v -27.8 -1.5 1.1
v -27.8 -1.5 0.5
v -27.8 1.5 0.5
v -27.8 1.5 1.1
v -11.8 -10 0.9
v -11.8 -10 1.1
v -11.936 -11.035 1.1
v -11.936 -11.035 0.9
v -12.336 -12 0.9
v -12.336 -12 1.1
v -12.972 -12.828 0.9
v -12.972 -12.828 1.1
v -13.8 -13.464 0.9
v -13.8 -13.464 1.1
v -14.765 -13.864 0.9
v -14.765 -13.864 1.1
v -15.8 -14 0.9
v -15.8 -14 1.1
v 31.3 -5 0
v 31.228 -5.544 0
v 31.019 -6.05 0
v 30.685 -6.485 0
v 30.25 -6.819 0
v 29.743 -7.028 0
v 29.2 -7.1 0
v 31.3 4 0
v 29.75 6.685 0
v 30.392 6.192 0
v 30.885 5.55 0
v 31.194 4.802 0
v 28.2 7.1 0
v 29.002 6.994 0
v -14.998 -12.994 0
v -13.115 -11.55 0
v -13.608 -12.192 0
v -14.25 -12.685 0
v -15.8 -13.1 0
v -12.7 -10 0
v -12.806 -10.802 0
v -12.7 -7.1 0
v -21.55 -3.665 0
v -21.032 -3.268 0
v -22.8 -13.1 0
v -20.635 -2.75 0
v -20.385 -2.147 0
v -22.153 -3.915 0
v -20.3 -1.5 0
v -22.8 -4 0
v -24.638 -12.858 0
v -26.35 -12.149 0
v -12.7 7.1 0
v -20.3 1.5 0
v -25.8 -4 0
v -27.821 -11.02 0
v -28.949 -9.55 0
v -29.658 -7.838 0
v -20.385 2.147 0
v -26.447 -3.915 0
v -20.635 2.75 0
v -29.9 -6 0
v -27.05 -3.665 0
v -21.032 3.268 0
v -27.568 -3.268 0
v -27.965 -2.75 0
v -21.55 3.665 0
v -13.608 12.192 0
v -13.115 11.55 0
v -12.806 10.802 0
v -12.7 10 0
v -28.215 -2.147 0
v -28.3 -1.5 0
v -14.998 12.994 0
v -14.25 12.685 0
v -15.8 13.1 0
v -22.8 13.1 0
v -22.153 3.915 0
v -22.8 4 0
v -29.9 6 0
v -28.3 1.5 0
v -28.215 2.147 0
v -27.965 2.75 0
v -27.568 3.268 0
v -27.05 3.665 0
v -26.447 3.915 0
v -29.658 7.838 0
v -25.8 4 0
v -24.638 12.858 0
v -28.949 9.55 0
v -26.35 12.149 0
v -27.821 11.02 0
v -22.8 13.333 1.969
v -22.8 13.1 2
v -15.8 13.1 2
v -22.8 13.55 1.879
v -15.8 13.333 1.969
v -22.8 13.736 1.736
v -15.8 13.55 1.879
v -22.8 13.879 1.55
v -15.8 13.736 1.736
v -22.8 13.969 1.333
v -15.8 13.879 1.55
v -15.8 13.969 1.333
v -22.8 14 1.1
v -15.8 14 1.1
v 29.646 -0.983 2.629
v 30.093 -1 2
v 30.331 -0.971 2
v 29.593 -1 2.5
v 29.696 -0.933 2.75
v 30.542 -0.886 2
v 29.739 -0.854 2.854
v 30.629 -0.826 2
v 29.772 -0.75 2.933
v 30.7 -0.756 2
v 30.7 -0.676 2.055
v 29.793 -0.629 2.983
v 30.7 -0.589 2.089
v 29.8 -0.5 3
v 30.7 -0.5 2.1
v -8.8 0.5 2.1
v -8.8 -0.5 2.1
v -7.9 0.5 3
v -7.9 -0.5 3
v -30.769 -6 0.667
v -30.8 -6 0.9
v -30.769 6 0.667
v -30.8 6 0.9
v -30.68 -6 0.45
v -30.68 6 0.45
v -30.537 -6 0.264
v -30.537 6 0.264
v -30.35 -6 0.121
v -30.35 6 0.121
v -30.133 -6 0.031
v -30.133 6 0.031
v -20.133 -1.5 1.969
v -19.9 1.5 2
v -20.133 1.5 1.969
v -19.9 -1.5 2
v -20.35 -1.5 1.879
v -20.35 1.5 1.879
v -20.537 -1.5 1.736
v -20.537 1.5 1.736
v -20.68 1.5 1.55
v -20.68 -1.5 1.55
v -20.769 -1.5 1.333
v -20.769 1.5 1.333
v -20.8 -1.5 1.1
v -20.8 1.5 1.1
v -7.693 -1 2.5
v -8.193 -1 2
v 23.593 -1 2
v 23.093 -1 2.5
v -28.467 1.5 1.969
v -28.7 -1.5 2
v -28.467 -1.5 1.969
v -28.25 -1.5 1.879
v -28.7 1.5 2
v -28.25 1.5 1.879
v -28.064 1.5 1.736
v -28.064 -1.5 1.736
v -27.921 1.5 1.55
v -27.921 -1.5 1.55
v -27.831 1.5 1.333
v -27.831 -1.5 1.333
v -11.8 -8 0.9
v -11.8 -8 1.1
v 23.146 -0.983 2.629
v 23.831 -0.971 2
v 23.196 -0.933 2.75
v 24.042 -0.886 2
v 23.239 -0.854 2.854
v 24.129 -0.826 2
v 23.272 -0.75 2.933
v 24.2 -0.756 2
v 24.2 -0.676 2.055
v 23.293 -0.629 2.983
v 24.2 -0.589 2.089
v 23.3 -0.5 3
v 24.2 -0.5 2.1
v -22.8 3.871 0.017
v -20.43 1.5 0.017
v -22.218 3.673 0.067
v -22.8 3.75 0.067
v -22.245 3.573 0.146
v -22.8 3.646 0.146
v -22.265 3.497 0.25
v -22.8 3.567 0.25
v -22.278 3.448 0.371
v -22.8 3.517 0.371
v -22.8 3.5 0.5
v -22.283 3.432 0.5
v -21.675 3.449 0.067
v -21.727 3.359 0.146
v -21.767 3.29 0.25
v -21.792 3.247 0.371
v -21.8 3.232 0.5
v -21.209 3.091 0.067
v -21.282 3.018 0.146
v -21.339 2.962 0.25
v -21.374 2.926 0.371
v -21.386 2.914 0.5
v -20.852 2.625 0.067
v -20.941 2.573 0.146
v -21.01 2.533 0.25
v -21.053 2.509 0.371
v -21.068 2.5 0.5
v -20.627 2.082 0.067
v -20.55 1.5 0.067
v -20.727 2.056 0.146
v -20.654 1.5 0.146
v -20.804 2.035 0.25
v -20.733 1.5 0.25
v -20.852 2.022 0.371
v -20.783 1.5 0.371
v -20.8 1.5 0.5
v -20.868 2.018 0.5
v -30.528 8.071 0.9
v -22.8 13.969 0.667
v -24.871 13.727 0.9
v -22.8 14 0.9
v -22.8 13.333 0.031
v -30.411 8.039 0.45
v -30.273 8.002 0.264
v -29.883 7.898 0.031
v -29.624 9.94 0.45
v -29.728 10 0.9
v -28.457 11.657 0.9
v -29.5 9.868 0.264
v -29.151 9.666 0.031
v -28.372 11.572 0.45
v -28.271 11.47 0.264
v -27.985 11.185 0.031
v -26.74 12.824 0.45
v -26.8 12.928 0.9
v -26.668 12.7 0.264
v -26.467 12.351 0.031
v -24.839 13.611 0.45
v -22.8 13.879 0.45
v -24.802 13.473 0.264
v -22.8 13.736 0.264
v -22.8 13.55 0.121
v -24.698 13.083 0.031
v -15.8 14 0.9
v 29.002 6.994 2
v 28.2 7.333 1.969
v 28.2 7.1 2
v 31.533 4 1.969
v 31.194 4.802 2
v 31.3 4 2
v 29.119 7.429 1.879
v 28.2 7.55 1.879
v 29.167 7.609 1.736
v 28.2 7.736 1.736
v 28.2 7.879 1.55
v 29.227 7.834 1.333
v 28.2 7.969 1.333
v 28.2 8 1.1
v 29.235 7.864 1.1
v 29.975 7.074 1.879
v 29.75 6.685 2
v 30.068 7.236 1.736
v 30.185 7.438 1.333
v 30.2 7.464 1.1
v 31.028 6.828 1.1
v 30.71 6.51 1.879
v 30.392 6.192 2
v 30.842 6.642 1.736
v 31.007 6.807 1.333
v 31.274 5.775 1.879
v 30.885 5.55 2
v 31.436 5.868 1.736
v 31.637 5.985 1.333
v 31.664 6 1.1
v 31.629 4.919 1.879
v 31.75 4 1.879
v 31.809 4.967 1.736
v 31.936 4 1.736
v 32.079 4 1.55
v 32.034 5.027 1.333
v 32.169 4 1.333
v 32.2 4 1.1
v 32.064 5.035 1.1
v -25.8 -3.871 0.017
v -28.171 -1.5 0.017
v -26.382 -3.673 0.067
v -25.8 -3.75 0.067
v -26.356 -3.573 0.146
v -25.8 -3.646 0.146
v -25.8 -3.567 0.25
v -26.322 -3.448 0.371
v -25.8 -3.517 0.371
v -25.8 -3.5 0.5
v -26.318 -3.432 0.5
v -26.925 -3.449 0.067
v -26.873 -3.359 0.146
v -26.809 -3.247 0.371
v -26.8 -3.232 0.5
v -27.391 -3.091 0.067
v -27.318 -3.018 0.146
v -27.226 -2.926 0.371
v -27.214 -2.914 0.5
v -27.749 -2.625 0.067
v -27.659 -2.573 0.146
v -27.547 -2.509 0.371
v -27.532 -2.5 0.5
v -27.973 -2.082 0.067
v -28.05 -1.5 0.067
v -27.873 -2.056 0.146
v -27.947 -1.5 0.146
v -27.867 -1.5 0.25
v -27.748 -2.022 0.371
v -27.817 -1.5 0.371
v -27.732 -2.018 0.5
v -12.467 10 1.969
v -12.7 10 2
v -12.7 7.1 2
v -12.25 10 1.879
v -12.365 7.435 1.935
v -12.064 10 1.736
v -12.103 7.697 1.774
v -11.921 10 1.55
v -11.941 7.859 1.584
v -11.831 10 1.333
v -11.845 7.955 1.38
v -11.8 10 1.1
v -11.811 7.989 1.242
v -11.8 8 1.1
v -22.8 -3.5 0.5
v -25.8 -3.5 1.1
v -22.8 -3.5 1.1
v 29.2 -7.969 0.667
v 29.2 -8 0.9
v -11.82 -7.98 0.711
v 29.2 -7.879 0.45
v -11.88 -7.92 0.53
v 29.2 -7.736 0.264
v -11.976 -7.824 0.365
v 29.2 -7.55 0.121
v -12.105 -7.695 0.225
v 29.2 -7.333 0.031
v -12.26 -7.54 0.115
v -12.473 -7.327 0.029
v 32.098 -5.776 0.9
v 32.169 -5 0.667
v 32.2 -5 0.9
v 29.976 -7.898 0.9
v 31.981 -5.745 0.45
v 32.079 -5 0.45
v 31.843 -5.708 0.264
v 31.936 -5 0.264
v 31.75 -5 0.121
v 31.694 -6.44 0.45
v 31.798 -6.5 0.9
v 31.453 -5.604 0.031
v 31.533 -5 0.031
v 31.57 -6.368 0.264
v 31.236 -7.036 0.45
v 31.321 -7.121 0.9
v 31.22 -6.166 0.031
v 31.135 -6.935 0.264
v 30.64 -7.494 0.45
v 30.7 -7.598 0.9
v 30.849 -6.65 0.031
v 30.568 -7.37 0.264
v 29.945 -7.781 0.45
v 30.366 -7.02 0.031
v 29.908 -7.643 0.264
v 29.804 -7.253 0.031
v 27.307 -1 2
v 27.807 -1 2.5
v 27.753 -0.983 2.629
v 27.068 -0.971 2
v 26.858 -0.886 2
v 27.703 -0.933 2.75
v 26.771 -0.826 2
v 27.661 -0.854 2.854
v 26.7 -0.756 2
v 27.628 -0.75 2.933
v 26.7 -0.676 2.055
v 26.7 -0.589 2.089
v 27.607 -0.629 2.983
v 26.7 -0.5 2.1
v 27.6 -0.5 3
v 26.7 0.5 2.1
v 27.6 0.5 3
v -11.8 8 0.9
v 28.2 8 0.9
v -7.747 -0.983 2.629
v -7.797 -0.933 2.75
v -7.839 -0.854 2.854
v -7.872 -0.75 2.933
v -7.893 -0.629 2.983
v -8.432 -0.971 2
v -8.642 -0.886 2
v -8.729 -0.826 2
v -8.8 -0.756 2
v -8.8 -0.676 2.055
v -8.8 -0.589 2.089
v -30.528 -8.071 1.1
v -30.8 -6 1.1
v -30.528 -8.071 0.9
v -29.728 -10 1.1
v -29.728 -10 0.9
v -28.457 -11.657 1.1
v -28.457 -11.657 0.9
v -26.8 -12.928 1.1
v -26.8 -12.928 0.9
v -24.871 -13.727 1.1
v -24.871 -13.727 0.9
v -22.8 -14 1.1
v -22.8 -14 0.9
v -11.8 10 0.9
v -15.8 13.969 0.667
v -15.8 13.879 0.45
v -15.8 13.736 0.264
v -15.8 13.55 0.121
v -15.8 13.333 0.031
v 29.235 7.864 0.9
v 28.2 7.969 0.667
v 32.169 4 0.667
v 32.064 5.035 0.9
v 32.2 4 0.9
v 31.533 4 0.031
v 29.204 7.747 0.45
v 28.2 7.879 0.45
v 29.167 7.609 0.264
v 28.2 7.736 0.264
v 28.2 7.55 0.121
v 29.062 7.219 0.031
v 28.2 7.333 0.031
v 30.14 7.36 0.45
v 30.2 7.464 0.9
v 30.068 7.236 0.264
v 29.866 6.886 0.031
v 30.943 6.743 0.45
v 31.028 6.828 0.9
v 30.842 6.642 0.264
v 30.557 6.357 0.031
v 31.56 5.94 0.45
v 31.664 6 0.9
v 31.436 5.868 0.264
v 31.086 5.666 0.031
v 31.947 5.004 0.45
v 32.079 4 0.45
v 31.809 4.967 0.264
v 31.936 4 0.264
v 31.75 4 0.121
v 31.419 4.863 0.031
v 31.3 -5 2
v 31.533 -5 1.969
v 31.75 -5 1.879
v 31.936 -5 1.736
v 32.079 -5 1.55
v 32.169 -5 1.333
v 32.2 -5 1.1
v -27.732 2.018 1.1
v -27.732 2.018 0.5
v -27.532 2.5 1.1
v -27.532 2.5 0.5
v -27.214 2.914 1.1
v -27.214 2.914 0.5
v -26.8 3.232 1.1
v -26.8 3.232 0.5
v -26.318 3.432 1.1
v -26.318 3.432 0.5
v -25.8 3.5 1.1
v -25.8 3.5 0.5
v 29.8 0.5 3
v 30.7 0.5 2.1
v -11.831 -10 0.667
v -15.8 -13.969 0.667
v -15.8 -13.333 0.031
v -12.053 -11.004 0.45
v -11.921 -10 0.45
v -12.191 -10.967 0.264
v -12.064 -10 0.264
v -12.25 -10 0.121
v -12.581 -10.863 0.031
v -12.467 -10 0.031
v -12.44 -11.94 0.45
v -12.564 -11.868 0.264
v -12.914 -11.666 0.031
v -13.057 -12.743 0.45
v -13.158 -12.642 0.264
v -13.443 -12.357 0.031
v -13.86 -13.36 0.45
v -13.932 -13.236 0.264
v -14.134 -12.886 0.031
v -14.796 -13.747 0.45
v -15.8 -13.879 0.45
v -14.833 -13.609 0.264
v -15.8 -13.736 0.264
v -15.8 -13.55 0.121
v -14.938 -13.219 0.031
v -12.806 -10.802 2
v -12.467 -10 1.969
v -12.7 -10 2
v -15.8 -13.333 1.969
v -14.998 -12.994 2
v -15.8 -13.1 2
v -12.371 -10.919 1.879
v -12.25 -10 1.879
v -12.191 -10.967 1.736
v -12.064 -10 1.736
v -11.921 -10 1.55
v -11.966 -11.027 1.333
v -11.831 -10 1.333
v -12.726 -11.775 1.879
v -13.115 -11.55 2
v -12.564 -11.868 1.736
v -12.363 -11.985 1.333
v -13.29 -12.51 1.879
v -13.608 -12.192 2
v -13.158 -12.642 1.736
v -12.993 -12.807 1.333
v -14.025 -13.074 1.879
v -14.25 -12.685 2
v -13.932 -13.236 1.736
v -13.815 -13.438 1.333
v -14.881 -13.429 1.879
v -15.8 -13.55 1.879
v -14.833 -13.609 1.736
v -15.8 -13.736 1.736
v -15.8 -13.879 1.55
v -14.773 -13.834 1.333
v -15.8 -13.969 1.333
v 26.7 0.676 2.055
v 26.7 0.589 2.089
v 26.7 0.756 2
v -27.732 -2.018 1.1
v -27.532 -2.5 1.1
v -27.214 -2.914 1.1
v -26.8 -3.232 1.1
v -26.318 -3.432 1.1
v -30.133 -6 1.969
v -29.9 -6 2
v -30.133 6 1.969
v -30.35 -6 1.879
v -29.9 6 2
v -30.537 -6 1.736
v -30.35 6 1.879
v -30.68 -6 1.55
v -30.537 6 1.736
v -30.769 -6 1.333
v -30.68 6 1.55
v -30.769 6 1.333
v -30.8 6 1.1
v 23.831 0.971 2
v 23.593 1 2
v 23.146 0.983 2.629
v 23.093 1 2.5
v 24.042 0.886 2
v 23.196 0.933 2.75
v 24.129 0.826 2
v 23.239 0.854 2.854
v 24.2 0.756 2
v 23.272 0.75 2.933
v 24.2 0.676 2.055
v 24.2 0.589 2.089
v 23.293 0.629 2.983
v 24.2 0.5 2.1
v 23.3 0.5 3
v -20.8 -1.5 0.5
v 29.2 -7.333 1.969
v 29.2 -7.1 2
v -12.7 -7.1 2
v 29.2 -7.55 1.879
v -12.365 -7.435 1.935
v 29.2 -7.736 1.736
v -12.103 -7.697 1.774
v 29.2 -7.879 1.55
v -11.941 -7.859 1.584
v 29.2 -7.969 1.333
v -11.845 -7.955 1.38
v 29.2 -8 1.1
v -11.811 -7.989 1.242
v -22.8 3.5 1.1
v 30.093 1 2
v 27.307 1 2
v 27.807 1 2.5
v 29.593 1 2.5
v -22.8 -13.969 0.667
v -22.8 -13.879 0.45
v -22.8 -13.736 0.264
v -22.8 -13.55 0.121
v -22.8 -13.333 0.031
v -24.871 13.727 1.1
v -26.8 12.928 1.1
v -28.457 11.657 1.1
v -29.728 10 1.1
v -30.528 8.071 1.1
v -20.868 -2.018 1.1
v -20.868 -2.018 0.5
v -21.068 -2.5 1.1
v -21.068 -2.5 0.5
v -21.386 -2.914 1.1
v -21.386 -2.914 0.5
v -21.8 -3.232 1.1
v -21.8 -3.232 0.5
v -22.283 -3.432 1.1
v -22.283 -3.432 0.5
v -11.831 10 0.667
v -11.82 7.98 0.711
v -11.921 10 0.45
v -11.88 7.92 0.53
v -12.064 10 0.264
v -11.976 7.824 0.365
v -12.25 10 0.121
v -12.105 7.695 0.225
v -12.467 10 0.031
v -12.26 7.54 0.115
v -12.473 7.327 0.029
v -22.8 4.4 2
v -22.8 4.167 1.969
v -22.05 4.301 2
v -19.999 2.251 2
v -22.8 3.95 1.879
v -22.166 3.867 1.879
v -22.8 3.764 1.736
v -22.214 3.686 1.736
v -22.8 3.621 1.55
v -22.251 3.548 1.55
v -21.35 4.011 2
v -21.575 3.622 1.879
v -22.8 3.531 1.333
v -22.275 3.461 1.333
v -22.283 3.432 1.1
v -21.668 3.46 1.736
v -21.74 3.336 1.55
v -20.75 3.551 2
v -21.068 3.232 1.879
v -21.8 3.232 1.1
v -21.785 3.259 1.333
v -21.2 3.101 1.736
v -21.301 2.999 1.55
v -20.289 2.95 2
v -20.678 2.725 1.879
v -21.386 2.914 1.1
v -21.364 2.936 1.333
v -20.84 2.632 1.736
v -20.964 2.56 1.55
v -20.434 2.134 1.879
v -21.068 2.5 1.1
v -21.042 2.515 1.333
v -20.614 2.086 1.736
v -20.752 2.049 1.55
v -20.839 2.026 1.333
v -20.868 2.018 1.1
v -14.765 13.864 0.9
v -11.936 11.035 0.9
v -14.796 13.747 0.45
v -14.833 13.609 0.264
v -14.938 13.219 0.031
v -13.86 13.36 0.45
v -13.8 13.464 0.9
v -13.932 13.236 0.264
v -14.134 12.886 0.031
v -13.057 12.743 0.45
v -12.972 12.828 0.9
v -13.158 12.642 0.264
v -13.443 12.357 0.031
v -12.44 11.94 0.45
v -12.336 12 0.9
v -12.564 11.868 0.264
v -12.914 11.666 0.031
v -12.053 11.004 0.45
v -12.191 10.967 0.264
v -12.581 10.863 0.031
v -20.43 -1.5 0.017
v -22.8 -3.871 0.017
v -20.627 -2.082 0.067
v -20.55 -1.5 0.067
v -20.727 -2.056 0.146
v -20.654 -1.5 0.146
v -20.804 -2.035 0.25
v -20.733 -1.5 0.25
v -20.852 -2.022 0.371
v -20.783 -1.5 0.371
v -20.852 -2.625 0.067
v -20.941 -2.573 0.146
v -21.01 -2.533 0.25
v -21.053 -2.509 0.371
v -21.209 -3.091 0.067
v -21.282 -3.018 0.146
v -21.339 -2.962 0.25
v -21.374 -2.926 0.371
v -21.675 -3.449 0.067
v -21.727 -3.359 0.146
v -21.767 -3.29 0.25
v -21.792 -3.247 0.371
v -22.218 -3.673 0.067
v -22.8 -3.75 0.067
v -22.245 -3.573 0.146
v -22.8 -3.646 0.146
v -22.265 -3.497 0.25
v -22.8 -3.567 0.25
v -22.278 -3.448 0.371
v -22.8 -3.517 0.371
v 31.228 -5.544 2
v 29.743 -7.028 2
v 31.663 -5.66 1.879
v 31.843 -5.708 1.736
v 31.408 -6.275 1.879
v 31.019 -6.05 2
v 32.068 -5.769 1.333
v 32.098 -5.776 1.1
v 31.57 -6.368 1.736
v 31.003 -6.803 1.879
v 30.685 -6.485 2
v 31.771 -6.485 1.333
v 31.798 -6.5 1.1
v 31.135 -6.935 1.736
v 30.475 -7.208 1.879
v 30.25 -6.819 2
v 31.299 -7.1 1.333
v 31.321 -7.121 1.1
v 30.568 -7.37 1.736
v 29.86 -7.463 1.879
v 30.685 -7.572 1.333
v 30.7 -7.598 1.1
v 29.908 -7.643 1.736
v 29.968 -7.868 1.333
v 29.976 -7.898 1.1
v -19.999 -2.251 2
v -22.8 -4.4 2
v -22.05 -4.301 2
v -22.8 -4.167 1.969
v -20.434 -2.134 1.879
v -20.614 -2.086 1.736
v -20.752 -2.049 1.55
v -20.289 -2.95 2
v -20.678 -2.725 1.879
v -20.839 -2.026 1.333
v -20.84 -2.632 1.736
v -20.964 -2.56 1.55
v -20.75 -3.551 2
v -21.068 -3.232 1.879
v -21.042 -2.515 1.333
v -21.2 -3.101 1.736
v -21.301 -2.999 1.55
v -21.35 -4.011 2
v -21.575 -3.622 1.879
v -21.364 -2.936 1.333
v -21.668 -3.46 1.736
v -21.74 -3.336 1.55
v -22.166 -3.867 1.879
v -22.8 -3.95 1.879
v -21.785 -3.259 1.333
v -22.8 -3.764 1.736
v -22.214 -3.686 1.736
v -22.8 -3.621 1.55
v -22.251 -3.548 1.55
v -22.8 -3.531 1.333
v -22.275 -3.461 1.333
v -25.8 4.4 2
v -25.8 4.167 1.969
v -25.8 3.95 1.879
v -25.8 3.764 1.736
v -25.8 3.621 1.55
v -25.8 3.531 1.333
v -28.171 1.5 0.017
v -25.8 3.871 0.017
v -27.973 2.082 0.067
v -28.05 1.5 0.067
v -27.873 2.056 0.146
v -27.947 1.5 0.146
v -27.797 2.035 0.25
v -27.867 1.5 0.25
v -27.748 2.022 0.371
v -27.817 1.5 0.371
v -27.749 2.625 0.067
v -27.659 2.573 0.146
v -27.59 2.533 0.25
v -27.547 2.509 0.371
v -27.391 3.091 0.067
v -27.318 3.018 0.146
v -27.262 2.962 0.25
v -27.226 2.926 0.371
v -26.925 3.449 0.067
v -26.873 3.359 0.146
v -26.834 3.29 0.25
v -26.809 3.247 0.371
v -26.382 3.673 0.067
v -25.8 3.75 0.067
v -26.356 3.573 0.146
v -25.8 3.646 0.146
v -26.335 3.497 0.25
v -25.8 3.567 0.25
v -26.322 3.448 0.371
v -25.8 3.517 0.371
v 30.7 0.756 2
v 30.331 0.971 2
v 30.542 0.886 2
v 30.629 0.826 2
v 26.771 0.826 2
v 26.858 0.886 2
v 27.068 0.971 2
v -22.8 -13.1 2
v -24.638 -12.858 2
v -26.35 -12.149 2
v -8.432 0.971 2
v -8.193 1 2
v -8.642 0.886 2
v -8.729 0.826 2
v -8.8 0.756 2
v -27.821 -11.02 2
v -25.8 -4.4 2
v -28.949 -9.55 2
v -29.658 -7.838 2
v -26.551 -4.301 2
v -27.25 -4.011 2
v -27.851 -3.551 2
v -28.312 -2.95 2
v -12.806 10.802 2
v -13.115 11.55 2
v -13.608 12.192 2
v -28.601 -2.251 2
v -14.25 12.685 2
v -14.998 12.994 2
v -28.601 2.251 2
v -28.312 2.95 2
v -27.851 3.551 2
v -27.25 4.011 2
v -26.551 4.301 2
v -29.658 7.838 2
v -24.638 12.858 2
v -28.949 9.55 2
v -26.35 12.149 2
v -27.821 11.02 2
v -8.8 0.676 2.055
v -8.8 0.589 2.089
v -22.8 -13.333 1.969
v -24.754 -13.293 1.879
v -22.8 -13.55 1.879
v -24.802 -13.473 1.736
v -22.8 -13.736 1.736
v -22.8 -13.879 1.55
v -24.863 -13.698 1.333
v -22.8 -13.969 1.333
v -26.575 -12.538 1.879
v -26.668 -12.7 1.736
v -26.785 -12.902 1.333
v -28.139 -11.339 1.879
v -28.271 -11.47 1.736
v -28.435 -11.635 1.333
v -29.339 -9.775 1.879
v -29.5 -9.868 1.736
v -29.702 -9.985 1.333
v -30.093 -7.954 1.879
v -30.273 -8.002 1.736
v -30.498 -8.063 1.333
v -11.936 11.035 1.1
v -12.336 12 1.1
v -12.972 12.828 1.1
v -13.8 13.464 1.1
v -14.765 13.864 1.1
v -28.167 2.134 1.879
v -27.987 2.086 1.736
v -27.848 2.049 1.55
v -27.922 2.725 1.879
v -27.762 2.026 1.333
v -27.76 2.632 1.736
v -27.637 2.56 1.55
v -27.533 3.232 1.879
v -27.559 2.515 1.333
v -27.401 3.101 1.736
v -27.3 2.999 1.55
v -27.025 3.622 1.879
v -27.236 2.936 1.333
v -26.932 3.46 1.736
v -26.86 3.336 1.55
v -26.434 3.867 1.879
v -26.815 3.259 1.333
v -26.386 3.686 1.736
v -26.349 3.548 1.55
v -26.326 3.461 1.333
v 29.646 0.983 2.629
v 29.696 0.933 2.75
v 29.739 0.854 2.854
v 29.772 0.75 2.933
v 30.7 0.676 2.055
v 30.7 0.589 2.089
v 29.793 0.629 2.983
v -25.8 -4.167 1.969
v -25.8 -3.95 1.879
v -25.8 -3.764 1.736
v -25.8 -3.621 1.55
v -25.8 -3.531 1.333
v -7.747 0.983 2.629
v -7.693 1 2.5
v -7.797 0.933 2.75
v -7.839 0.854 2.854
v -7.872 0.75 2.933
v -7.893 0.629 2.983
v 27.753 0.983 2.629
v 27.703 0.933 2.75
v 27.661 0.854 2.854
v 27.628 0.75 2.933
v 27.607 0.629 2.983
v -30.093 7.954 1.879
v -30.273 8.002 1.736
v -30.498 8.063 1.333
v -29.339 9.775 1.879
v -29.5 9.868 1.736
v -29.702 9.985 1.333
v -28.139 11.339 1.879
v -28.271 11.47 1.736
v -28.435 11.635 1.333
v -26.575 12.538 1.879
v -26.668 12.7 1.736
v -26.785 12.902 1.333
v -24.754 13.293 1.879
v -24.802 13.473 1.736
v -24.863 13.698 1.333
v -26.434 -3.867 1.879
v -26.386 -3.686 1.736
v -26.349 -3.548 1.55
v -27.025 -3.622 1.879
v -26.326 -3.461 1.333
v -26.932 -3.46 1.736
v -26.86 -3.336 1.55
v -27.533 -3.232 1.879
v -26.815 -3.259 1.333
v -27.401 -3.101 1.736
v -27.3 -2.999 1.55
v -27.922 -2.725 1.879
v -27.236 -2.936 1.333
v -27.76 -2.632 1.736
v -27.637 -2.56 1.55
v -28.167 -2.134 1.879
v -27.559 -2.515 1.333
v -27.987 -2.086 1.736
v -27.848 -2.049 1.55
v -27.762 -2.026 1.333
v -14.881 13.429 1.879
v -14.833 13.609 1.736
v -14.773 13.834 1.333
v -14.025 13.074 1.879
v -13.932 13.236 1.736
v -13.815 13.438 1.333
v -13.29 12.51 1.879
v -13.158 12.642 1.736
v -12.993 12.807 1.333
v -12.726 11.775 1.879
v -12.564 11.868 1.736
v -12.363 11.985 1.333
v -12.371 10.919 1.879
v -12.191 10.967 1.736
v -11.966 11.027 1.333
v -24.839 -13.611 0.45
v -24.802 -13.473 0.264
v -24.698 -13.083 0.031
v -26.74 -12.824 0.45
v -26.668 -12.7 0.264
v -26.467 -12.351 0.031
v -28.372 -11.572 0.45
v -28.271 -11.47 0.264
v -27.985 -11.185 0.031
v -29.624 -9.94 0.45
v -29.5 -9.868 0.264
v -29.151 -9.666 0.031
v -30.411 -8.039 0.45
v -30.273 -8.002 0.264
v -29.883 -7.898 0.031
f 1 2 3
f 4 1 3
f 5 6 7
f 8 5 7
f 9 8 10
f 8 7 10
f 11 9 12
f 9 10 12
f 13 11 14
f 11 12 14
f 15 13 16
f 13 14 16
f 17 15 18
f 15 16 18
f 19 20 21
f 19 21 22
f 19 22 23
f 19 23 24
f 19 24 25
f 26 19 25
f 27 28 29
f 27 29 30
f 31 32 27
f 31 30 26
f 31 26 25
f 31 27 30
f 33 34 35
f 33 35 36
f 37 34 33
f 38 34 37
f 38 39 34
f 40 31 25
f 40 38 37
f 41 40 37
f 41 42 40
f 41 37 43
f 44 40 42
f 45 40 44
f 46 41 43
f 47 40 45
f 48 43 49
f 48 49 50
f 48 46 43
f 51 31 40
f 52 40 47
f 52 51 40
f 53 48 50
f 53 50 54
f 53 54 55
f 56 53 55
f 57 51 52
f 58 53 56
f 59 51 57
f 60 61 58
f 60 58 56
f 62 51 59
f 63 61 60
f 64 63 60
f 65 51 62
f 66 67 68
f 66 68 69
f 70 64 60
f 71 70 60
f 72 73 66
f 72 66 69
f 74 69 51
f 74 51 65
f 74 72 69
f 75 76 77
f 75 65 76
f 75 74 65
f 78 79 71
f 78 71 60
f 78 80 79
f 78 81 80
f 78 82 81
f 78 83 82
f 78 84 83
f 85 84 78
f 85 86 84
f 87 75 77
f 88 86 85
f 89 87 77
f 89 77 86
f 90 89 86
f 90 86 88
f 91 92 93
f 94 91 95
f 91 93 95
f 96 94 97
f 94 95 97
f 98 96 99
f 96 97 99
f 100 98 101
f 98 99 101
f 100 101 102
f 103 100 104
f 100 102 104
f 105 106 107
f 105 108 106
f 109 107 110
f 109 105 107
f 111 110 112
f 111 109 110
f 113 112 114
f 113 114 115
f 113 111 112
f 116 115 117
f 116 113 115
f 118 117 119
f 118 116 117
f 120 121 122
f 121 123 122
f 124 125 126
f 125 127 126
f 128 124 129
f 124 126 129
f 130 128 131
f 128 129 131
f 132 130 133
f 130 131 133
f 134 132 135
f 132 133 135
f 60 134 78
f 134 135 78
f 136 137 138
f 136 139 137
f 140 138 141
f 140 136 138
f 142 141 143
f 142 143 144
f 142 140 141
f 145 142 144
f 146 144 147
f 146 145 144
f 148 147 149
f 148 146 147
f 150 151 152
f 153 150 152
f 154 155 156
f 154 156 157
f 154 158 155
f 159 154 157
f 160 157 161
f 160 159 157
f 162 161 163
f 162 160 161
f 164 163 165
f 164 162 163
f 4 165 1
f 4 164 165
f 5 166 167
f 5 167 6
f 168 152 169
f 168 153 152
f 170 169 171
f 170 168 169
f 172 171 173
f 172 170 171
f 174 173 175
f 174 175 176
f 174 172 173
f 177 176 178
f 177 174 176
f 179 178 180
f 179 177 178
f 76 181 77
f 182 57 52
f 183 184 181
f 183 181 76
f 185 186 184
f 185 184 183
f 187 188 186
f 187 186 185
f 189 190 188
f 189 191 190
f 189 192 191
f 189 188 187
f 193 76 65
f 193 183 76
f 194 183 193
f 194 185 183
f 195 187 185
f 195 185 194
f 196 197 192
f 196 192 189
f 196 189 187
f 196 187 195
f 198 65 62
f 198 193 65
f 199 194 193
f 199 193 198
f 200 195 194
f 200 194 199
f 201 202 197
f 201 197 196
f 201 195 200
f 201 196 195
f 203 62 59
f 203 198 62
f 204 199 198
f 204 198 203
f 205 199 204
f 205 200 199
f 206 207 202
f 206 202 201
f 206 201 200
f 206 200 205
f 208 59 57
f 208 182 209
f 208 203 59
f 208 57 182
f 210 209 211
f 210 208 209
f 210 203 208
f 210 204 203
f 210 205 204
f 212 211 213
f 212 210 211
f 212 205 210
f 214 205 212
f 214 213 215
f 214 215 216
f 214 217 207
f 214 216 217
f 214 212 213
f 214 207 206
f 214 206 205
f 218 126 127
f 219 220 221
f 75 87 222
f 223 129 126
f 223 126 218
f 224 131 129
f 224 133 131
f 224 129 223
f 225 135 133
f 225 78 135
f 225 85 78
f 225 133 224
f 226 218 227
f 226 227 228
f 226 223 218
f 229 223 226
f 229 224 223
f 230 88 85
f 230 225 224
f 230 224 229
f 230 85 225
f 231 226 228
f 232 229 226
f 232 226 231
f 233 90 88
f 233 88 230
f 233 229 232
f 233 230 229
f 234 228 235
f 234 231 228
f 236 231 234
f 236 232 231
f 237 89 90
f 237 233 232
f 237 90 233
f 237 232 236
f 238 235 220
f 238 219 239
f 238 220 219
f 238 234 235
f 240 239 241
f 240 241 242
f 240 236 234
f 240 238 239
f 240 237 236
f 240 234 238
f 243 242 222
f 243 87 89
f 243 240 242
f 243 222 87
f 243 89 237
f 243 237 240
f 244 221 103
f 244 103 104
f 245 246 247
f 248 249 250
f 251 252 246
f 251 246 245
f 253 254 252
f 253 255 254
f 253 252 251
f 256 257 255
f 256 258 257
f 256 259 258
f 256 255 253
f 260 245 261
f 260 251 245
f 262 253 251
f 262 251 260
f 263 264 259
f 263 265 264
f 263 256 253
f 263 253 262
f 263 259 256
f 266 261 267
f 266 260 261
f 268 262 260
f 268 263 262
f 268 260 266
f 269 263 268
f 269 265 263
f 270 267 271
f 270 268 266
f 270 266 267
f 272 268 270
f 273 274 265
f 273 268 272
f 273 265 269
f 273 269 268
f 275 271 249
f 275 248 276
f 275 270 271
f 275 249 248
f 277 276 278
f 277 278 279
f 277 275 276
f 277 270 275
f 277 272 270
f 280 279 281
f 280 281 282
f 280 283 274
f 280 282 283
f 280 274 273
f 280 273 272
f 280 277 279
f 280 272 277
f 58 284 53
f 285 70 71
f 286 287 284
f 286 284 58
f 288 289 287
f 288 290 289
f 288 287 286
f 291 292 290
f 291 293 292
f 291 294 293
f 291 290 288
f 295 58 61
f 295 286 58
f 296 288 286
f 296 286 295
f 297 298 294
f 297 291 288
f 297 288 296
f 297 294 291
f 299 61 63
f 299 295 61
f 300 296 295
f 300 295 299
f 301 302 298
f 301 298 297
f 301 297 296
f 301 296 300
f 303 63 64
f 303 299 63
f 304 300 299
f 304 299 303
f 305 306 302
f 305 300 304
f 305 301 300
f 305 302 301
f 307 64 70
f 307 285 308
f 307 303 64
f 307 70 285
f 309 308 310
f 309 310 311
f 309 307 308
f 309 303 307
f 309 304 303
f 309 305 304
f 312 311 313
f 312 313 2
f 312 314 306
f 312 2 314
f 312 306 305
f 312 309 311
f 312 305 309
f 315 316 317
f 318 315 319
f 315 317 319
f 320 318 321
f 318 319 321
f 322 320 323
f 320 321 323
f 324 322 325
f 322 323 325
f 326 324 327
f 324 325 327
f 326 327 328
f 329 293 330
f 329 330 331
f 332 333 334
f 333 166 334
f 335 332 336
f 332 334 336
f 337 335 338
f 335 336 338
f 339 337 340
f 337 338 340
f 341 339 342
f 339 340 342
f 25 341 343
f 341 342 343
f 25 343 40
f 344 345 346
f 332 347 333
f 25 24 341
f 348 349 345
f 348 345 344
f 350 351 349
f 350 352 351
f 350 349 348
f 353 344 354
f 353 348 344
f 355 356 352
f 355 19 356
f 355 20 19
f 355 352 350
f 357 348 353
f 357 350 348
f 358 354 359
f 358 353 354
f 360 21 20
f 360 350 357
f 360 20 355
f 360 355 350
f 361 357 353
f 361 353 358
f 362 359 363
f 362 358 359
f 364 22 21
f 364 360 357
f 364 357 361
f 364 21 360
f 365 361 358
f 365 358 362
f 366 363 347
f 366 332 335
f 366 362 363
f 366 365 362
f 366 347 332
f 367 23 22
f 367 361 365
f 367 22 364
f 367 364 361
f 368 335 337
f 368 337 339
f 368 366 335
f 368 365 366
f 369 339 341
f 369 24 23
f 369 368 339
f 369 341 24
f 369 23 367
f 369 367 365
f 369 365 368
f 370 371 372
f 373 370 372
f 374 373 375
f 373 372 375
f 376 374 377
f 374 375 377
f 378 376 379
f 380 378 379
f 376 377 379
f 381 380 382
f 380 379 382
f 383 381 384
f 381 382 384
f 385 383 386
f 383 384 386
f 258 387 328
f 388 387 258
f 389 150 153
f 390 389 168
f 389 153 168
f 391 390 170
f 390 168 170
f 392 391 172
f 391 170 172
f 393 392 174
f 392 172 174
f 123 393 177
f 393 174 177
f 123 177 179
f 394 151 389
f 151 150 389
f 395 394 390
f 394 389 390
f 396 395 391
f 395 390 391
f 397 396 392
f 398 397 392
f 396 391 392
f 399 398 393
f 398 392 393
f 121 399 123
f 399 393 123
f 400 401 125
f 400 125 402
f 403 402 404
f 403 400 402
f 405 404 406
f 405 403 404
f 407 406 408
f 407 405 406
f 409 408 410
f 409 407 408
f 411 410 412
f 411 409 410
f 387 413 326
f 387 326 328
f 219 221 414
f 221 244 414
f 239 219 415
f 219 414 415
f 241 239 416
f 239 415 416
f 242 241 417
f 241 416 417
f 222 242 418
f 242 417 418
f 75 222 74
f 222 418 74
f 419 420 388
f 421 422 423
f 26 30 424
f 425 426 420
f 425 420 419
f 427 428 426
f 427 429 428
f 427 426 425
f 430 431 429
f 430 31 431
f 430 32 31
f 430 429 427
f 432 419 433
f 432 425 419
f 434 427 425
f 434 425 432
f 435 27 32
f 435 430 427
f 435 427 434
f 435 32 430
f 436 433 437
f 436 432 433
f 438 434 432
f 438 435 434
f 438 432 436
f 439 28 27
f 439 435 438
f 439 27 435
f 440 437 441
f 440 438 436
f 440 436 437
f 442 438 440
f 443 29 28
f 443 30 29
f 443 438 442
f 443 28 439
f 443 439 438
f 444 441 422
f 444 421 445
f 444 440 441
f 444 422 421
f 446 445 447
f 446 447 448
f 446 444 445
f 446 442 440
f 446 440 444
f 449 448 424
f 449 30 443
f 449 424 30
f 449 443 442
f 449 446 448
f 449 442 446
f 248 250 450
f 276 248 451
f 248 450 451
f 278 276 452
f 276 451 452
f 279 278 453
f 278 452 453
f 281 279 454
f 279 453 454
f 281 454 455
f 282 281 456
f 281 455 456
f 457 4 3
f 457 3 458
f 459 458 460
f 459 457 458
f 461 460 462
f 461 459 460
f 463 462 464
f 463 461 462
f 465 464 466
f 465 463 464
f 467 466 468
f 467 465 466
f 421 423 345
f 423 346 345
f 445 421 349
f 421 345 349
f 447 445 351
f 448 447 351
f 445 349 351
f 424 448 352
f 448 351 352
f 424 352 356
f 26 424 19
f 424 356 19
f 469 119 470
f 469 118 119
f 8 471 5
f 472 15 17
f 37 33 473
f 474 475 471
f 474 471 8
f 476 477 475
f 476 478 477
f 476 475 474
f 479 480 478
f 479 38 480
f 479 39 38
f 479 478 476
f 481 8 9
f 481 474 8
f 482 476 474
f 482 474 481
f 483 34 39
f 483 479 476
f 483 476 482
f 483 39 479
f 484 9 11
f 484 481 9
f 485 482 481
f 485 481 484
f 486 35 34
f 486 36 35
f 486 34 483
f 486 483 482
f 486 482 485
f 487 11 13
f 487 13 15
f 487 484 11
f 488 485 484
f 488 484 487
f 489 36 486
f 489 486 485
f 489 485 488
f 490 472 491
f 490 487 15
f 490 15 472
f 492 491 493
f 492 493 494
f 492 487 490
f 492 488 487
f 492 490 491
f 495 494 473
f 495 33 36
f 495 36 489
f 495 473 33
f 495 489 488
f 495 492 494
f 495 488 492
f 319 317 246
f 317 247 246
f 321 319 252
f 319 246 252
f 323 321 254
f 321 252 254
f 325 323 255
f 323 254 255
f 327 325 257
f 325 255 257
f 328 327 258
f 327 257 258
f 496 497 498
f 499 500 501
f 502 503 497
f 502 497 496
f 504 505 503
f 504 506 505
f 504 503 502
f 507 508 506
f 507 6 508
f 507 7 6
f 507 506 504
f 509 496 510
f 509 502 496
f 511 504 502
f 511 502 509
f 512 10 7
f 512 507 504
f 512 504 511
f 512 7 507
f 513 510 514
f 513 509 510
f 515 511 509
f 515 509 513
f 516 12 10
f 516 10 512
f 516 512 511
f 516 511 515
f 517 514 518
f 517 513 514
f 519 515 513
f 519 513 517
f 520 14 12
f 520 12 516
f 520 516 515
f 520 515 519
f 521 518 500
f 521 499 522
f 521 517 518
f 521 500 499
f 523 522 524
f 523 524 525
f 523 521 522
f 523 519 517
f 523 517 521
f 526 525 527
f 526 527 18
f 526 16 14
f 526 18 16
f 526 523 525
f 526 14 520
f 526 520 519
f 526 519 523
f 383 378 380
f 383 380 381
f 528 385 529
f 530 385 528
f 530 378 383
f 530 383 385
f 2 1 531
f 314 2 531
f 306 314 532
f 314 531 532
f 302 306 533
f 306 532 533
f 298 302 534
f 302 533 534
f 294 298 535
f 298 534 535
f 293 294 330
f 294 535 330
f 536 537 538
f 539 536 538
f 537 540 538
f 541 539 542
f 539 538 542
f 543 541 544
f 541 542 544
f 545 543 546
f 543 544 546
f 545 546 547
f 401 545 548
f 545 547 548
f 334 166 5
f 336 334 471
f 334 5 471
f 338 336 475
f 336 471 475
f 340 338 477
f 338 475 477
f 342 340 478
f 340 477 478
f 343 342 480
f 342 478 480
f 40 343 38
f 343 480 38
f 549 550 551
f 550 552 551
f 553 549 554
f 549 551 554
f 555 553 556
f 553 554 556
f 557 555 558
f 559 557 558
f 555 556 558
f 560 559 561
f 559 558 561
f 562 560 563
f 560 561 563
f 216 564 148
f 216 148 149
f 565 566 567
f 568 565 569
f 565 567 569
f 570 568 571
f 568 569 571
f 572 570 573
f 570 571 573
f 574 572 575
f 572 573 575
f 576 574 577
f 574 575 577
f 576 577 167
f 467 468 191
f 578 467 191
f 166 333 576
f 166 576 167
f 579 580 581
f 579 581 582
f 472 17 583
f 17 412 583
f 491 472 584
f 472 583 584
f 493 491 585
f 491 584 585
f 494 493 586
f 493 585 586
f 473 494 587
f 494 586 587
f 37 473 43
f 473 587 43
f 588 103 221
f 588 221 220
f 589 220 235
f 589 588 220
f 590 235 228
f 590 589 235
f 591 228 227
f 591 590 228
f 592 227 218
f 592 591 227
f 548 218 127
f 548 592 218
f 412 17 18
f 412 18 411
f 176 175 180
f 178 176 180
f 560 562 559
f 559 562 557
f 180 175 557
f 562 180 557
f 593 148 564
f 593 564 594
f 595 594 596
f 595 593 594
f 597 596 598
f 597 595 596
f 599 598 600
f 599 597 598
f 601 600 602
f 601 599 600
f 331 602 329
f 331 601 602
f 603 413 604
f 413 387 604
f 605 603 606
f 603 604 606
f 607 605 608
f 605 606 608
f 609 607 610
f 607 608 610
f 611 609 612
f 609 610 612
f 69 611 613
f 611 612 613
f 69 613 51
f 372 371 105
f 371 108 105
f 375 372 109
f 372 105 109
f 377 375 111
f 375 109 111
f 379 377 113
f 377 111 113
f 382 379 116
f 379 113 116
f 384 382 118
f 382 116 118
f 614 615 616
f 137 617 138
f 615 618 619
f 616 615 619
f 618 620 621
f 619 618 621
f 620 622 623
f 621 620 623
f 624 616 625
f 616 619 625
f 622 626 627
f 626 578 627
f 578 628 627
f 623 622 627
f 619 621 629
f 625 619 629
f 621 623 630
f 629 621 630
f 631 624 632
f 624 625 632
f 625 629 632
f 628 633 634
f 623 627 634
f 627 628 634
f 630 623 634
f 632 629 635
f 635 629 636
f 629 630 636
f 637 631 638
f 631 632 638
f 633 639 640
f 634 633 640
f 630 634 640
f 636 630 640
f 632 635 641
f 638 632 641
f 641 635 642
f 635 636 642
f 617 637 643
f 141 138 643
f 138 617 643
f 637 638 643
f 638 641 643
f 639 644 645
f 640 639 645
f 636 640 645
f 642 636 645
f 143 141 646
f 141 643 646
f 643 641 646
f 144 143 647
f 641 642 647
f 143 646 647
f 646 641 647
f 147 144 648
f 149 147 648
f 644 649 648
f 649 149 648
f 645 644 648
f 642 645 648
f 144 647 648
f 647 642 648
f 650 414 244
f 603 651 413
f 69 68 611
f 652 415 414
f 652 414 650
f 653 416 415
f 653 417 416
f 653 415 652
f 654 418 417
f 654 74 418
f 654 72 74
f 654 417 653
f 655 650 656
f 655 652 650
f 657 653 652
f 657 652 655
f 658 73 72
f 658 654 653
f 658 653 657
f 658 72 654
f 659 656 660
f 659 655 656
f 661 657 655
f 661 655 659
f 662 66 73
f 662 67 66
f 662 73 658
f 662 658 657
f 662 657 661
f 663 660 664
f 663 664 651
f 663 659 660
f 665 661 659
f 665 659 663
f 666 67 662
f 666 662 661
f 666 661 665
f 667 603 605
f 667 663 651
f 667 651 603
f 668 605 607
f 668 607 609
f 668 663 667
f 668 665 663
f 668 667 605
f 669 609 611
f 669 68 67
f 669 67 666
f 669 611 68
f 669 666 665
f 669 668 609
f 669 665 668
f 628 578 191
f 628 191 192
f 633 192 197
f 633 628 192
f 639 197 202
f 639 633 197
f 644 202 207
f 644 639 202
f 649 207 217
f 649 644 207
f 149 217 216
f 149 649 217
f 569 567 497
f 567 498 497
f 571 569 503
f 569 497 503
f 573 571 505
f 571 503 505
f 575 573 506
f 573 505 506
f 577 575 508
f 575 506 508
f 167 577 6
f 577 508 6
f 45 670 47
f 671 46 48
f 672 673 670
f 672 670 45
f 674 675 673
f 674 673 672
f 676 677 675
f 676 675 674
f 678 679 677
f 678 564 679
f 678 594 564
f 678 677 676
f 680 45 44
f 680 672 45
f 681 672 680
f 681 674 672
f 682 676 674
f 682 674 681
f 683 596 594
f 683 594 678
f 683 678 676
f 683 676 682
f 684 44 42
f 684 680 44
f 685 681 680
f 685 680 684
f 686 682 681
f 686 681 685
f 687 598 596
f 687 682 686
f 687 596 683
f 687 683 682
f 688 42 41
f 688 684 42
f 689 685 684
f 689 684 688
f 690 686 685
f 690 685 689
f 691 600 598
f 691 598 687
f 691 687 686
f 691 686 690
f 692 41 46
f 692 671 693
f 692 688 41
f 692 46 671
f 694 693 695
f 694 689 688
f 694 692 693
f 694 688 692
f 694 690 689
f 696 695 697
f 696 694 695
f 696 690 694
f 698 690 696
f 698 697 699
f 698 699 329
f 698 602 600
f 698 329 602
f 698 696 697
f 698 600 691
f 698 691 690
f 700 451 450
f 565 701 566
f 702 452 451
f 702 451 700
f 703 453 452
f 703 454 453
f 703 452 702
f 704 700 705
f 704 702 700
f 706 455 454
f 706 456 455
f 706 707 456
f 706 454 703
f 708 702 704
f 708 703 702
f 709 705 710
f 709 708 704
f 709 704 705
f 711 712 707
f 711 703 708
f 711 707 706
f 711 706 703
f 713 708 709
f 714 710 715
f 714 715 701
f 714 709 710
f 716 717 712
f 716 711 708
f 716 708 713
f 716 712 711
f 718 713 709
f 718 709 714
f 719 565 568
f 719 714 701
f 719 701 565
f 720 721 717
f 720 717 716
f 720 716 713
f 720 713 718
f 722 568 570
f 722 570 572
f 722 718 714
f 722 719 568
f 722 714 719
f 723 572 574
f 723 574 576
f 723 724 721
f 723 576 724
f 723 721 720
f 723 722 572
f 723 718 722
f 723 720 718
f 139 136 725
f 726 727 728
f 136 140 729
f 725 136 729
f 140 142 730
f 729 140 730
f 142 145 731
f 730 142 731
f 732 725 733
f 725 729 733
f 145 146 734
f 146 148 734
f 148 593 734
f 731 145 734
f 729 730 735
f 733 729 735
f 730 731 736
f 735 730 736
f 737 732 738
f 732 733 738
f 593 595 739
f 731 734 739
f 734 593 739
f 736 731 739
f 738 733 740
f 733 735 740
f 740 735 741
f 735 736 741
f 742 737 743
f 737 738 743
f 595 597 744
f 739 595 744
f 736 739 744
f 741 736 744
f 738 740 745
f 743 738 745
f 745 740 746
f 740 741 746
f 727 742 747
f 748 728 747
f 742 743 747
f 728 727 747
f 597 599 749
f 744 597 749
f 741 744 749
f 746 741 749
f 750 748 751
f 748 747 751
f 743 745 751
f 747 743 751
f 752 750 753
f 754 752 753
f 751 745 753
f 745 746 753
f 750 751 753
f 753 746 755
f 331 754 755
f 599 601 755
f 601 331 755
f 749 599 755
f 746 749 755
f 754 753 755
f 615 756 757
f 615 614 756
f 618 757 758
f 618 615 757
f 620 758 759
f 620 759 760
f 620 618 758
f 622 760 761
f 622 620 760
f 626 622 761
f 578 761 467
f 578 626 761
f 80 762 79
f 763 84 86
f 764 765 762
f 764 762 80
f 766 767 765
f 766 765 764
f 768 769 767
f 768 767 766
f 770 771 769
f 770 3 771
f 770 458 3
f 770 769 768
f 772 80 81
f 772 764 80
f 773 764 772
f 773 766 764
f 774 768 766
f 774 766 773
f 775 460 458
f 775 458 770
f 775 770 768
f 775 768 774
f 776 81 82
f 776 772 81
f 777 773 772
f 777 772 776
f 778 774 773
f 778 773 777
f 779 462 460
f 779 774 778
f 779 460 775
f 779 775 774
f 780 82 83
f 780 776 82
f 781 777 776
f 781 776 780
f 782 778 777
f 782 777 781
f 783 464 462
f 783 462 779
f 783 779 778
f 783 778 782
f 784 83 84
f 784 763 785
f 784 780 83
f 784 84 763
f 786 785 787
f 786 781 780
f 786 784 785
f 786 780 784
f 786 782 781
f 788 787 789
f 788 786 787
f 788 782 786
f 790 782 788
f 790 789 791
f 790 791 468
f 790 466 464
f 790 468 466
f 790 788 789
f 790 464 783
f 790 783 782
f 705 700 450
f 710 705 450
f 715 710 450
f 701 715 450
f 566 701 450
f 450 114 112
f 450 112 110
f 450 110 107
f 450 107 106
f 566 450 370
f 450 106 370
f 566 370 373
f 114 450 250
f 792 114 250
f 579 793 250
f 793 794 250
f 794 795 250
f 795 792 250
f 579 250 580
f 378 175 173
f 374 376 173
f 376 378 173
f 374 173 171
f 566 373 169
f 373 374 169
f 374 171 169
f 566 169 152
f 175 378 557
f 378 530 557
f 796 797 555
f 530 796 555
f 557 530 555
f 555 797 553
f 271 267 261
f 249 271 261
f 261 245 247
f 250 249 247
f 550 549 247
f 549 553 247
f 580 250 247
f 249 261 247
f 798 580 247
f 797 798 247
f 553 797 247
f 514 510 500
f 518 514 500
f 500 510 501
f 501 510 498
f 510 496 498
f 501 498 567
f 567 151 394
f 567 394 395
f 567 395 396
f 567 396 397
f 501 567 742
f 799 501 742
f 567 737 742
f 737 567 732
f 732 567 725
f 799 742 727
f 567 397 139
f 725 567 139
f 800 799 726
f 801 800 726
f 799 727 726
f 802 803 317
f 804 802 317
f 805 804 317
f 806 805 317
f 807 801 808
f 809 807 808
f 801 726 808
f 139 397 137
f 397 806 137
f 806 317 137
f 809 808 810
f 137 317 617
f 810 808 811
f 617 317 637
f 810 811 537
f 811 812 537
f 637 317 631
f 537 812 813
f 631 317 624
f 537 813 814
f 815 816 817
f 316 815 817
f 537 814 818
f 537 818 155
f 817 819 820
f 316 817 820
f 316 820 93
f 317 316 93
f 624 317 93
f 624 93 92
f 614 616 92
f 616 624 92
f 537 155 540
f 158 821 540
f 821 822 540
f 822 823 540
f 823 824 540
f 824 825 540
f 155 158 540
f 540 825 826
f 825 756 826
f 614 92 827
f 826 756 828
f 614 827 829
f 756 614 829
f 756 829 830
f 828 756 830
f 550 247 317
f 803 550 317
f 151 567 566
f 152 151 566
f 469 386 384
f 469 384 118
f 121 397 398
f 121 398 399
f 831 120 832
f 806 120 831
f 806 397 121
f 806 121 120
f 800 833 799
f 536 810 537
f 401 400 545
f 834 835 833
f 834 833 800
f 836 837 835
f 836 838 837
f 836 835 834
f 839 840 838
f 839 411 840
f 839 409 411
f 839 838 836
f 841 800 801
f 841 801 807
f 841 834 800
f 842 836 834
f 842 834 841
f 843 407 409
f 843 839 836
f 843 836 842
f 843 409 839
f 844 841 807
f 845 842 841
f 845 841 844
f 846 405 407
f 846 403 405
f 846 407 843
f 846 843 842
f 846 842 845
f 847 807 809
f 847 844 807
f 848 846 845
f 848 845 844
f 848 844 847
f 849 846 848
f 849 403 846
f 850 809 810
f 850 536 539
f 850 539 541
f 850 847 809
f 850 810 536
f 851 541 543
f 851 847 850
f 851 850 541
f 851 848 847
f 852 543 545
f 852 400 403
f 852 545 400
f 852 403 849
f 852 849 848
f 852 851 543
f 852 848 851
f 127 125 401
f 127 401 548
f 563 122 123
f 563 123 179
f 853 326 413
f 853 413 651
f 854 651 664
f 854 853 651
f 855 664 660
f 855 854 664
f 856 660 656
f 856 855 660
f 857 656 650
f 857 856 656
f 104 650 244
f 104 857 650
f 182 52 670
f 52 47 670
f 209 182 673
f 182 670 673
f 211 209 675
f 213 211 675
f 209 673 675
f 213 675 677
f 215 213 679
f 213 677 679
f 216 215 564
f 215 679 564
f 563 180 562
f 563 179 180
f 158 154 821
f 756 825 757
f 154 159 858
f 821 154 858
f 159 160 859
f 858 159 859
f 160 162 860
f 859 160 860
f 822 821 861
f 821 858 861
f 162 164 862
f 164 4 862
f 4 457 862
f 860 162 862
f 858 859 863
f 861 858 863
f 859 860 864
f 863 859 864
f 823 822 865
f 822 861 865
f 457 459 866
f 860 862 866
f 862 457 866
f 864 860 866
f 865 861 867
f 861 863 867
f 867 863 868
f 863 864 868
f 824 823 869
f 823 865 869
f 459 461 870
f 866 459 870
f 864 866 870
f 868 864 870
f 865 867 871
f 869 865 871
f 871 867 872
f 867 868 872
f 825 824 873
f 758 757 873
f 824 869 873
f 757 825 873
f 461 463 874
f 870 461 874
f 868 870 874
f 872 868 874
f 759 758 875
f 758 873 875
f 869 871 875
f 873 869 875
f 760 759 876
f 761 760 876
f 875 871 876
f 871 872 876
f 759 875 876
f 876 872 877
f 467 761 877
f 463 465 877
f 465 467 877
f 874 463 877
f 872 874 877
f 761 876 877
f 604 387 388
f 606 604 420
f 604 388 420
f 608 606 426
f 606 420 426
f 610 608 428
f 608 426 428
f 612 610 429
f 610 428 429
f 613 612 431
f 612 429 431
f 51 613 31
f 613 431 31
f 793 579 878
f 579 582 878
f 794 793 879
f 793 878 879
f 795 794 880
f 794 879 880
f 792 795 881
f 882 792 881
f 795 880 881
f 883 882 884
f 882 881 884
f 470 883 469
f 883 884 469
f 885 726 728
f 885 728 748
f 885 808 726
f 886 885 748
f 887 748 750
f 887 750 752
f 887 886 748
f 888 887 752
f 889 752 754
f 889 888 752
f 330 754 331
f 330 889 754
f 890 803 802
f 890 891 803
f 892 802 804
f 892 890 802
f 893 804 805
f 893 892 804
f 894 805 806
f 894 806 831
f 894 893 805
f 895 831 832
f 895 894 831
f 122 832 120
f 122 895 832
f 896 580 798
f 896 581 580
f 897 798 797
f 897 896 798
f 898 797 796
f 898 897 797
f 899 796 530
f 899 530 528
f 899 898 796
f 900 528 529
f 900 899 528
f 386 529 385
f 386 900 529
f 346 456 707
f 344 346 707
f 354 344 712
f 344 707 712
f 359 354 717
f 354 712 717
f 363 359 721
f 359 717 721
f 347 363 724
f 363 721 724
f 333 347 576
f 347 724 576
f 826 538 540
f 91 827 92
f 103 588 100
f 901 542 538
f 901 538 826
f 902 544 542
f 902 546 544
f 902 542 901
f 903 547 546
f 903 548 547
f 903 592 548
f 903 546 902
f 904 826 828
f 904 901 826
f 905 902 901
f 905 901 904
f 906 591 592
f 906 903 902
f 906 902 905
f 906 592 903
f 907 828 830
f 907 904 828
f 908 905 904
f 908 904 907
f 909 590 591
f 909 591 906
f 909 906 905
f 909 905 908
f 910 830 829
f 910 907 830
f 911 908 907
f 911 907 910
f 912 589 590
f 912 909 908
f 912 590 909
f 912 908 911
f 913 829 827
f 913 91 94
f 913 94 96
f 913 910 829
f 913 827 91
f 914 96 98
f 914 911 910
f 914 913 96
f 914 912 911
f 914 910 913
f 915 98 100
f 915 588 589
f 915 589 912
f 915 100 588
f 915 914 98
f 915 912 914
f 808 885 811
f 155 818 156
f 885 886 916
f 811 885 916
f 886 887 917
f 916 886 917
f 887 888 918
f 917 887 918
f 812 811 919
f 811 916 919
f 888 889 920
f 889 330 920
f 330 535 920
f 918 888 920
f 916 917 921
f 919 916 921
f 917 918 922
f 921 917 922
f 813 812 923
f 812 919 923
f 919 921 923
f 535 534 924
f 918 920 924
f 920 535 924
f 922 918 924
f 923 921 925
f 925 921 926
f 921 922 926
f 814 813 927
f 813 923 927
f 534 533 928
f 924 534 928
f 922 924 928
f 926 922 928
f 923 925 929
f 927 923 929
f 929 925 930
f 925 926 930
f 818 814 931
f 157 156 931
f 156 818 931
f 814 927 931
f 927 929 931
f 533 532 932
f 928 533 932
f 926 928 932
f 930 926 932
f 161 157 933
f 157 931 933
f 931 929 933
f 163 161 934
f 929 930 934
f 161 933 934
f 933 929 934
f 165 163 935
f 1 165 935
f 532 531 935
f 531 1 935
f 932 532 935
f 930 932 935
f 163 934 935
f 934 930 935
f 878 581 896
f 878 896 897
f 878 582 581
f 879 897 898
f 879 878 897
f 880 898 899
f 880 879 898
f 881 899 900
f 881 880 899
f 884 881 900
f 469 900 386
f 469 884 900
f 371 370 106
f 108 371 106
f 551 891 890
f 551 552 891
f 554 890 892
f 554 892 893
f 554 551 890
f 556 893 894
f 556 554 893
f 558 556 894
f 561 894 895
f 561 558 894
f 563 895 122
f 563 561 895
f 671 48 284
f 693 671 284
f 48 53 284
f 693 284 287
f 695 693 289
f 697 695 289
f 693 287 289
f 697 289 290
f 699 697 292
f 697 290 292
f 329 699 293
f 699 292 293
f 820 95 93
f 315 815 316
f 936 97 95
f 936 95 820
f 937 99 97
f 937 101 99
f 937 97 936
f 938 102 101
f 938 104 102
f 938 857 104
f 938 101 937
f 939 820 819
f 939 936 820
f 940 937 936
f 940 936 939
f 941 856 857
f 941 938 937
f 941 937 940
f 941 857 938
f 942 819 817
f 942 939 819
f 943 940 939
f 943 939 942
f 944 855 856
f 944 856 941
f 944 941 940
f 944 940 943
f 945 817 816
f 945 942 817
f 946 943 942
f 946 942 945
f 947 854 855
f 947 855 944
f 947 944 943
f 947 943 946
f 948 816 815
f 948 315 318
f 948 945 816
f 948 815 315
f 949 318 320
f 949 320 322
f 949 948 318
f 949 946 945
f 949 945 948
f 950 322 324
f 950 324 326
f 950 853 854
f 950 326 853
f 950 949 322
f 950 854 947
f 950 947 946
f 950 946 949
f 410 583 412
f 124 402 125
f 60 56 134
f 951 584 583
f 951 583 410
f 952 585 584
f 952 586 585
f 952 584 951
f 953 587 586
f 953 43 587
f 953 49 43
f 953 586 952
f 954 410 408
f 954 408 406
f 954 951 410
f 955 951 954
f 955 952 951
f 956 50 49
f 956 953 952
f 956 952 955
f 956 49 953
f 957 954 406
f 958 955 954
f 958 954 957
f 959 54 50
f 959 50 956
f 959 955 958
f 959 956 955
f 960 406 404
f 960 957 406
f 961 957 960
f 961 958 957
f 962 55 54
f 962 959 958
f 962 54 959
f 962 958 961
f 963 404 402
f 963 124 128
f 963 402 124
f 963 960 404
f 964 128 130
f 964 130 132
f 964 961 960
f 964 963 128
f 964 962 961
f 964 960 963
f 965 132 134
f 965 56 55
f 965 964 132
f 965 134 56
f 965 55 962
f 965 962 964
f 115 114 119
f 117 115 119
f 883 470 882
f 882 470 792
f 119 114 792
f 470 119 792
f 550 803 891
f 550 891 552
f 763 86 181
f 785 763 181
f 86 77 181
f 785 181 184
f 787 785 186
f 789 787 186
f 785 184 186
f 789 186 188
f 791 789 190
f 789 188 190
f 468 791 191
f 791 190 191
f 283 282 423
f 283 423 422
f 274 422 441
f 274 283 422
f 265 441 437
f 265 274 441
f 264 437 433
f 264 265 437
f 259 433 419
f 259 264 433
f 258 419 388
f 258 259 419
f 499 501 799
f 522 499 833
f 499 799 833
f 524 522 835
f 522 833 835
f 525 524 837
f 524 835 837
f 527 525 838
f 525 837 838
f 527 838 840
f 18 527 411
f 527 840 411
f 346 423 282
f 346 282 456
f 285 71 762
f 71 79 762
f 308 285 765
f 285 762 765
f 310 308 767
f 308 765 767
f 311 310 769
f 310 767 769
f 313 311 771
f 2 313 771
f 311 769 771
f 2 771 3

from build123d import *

# Parameters (mm, degrees)
SKETCH_W      = 7
SKETCH_H      = 7
PAD_DEPTH     = 2
FILLET_R      = 4
FILLET001_R   = 8
FILLET002_R   = 2
FILLET003_R   = 3
SKETCH001_W   = 33
SKETCH001_H   = 2
SKETCH001_W_2 = 4
PAD001_DEPTH  = 1
FILLET004_R   = 4
CHAMFER_SIZE  = 0.9
FILLET005_R   = 0.9
FILLET006_R   = 0.9
FILLET007_R   = 0.9
FILLET008_R   = 0.5
FILLET009_R   = 0.5
FILLET010_R   = 0.5


with BuildPart() as part:
    # Sketch → Pad (new body)
    with BuildSketch(Plane.XY):
        Polygon((-11.80015, 8), (32.19985, 8), (32.19985, -8), (-11.80015, -8), (-11.80015, -14), (-30.80015, -14), (-30.80015, 14), (-11.80015, 14), align=None)
        with Locations((-24.30015, 0)):
            Rectangle(SKETCH_W, SKETCH_H, mode=Mode.SUBTRACT)
    extrude(amount=PAD_DEPTH)

    # Fillet
    fillet_edges = [part.edges().sort_by_distance(p)[0] for p in [
        (-11.80015, -14, 1),
        (-11.80015, 14, 1),
    ]]
    fillet(fillet_edges, radius=FILLET_R)

    # Fillet001
    fillet001_edges = [part.edges().sort_by_distance(p)[0] for p in [
        (-30.80015, -14, 1),
        (-30.80015, 14, 1),
    ]]
    fillet(fillet001_edges, radius=FILLET001_R)

    # Fillet002
    fillet002_edges = [part.edges().sort_by_distance(p)[0] for p in [
        (-20.80015, -3.5, 1),
        (-20.80015, 3.5, 1),
        (-27.80015, 3.5, 1),
        (-27.80015, -3.5, 1),
    ]]
    fillet(fillet002_edges, radius=FILLET002_R)

    # Fillet003
    fillet003_edges = [part.edges().sort_by_distance(p)[0] for p in [
        (32.19985, -8, 1),
    ]]
    fillet(fillet003_edges, radius=FILLET003_R)

    # Sketch001 → Pad001 (new body)
    with BuildSketch(Plane.XY.offset(2)):
        with Locations((7.69985, 0)):
            Rectangle(SKETCH001_W, SKETCH001_H)
        with Locations((28.69985, 0)):
            Rectangle(SKETCH001_W_2, SKETCH001_H)
    extrude(amount=PAD001_DEPTH)

    # Fillet004
    fillet004_edges = [part.edges().sort_by_distance(p)[0] for p in [
        (32.19985, 8, 1),
    ]]
    fillet(fillet004_edges, radius=FILLET004_R)

    # Chamfer
    chamfer_edges = [part.edges().sort_by_distance(p)[0] for p in [
        (-8.80015, 0, 3),
        (24.19985, 0, 3),
        (26.69985, 0, 3),
        (30.69985, 0, 3),
    ]]
    chamfer(chamfer_edges, length=CHAMFER_SIZE)

    # Fillet005
    fillet005_edges = [part.edges().sort_by_distance(p)[0] for p in [
        (8.69985, -8, 2),
        (31.32117, -7.12132, 2),
        (32.19985, -0.5, 2),
        (31.028277, 6.828427, 2),
        (8.19985, 8, 2),
        (-11.80015, -9, 2),
        (-12.971723, -12.828427, 2),
        (-19.30015, -14, 2),
        (-28.457005, -11.656854, 2),
        (-30.80015, 0, 2),
        (-28.457005, 11.656854, 2),
        (-19.30015, 14, 2),
        (-12.971723, 12.828427, 2),
        (-11.80015, 9, 2),
    ]]
    fillet(fillet005_edges, radius=FILLET005_R)

    # Fillet006
    fillet006_edges = [part.edges().sort_by_distance(p)[0] for p in [
        (-21.385937, 2.914214, 2),
        (-20.80015, 0, 2),
        (-21.385937, -2.914214, 2),
        (-24.30015, -3.5, 2),
        (-27.214364, -2.914214, 2),
        (-27.80015, 0, 2),
        (-27.214364, 2.914214, 2),
        (-24.30015, 3.5, 2),
    ]]
    fillet(fillet006_edges, radius=FILLET006_R)

    # Fillet007
    fillet007_edges = [part.edges().sort_by_distance(p)[0] for p in [
        (8.69985, -8, 0),
        (31.32117, -7.12132, 0),
        (32.19985, -0.5, 0),
        (31.028277, 6.828427, 0),
        (8.19985, 8, 0),
        (-11.80015, 9, 0),
        (-12.971723, 12.828427, 0),
        (-19.30015, 14, 0),
        (-28.457005, 11.656854, 0),
        (-30.80015, 0, 0),
        (-28.457005, -11.656854, 0),
        (-19.30015, -14, 0),
        (-12.971723, -12.828427, 0),
        (-11.80015, -9, 0),
    ]]
    fillet(fillet007_edges, radius=FILLET007_R)

    # Fillet008
    fillet008_edges = [part.edges().sort_by_distance(p)[0] for p in [
        (-27.80015, 0, 0),
        (-27.214364, -2.914214, 0),
        (-24.30015, -3.5, 0),
        (-21.385937, -2.914214, 0),
        (-20.80015, 0, 0),
        (-21.385937, 2.914214, 0),
        (-24.30015, 3.5, 0),
        (-27.214364, 2.914214, 0),
    ]]
    fillet(fillet008_edges, radius=FILLET008_R)

    # Fillet009
    fillet009_edges = [part.edges().sort_by_distance(p)[0] for p in [
        (28.69985, -1, 3),
        (27.14985, -1, 2.55),
        (27.14985, 1, 2.55),
        (28.69985, 1, 3),
        (30.24985, 1, 2.55),
        (30.24985, -1, 2.55),
    ]]
    fillet(fillet009_edges, radius=FILLET009_R)

    # Fillet010
    fillet010_edges = [part.edges().sort_by_distance(p)[0] for p in [
        (7.69985, -1, 3),
        (7.69985, 1, 3),
        (23.74985, 1, 2.55),
        (23.74985, -1, 2.55),
        (-8.35015, -1, 2.55),
        (-8.35015, 1, 2.55),
    ]]
    fillet(fillet010_edges, radius=FILLET010_R)


solid = part.part
